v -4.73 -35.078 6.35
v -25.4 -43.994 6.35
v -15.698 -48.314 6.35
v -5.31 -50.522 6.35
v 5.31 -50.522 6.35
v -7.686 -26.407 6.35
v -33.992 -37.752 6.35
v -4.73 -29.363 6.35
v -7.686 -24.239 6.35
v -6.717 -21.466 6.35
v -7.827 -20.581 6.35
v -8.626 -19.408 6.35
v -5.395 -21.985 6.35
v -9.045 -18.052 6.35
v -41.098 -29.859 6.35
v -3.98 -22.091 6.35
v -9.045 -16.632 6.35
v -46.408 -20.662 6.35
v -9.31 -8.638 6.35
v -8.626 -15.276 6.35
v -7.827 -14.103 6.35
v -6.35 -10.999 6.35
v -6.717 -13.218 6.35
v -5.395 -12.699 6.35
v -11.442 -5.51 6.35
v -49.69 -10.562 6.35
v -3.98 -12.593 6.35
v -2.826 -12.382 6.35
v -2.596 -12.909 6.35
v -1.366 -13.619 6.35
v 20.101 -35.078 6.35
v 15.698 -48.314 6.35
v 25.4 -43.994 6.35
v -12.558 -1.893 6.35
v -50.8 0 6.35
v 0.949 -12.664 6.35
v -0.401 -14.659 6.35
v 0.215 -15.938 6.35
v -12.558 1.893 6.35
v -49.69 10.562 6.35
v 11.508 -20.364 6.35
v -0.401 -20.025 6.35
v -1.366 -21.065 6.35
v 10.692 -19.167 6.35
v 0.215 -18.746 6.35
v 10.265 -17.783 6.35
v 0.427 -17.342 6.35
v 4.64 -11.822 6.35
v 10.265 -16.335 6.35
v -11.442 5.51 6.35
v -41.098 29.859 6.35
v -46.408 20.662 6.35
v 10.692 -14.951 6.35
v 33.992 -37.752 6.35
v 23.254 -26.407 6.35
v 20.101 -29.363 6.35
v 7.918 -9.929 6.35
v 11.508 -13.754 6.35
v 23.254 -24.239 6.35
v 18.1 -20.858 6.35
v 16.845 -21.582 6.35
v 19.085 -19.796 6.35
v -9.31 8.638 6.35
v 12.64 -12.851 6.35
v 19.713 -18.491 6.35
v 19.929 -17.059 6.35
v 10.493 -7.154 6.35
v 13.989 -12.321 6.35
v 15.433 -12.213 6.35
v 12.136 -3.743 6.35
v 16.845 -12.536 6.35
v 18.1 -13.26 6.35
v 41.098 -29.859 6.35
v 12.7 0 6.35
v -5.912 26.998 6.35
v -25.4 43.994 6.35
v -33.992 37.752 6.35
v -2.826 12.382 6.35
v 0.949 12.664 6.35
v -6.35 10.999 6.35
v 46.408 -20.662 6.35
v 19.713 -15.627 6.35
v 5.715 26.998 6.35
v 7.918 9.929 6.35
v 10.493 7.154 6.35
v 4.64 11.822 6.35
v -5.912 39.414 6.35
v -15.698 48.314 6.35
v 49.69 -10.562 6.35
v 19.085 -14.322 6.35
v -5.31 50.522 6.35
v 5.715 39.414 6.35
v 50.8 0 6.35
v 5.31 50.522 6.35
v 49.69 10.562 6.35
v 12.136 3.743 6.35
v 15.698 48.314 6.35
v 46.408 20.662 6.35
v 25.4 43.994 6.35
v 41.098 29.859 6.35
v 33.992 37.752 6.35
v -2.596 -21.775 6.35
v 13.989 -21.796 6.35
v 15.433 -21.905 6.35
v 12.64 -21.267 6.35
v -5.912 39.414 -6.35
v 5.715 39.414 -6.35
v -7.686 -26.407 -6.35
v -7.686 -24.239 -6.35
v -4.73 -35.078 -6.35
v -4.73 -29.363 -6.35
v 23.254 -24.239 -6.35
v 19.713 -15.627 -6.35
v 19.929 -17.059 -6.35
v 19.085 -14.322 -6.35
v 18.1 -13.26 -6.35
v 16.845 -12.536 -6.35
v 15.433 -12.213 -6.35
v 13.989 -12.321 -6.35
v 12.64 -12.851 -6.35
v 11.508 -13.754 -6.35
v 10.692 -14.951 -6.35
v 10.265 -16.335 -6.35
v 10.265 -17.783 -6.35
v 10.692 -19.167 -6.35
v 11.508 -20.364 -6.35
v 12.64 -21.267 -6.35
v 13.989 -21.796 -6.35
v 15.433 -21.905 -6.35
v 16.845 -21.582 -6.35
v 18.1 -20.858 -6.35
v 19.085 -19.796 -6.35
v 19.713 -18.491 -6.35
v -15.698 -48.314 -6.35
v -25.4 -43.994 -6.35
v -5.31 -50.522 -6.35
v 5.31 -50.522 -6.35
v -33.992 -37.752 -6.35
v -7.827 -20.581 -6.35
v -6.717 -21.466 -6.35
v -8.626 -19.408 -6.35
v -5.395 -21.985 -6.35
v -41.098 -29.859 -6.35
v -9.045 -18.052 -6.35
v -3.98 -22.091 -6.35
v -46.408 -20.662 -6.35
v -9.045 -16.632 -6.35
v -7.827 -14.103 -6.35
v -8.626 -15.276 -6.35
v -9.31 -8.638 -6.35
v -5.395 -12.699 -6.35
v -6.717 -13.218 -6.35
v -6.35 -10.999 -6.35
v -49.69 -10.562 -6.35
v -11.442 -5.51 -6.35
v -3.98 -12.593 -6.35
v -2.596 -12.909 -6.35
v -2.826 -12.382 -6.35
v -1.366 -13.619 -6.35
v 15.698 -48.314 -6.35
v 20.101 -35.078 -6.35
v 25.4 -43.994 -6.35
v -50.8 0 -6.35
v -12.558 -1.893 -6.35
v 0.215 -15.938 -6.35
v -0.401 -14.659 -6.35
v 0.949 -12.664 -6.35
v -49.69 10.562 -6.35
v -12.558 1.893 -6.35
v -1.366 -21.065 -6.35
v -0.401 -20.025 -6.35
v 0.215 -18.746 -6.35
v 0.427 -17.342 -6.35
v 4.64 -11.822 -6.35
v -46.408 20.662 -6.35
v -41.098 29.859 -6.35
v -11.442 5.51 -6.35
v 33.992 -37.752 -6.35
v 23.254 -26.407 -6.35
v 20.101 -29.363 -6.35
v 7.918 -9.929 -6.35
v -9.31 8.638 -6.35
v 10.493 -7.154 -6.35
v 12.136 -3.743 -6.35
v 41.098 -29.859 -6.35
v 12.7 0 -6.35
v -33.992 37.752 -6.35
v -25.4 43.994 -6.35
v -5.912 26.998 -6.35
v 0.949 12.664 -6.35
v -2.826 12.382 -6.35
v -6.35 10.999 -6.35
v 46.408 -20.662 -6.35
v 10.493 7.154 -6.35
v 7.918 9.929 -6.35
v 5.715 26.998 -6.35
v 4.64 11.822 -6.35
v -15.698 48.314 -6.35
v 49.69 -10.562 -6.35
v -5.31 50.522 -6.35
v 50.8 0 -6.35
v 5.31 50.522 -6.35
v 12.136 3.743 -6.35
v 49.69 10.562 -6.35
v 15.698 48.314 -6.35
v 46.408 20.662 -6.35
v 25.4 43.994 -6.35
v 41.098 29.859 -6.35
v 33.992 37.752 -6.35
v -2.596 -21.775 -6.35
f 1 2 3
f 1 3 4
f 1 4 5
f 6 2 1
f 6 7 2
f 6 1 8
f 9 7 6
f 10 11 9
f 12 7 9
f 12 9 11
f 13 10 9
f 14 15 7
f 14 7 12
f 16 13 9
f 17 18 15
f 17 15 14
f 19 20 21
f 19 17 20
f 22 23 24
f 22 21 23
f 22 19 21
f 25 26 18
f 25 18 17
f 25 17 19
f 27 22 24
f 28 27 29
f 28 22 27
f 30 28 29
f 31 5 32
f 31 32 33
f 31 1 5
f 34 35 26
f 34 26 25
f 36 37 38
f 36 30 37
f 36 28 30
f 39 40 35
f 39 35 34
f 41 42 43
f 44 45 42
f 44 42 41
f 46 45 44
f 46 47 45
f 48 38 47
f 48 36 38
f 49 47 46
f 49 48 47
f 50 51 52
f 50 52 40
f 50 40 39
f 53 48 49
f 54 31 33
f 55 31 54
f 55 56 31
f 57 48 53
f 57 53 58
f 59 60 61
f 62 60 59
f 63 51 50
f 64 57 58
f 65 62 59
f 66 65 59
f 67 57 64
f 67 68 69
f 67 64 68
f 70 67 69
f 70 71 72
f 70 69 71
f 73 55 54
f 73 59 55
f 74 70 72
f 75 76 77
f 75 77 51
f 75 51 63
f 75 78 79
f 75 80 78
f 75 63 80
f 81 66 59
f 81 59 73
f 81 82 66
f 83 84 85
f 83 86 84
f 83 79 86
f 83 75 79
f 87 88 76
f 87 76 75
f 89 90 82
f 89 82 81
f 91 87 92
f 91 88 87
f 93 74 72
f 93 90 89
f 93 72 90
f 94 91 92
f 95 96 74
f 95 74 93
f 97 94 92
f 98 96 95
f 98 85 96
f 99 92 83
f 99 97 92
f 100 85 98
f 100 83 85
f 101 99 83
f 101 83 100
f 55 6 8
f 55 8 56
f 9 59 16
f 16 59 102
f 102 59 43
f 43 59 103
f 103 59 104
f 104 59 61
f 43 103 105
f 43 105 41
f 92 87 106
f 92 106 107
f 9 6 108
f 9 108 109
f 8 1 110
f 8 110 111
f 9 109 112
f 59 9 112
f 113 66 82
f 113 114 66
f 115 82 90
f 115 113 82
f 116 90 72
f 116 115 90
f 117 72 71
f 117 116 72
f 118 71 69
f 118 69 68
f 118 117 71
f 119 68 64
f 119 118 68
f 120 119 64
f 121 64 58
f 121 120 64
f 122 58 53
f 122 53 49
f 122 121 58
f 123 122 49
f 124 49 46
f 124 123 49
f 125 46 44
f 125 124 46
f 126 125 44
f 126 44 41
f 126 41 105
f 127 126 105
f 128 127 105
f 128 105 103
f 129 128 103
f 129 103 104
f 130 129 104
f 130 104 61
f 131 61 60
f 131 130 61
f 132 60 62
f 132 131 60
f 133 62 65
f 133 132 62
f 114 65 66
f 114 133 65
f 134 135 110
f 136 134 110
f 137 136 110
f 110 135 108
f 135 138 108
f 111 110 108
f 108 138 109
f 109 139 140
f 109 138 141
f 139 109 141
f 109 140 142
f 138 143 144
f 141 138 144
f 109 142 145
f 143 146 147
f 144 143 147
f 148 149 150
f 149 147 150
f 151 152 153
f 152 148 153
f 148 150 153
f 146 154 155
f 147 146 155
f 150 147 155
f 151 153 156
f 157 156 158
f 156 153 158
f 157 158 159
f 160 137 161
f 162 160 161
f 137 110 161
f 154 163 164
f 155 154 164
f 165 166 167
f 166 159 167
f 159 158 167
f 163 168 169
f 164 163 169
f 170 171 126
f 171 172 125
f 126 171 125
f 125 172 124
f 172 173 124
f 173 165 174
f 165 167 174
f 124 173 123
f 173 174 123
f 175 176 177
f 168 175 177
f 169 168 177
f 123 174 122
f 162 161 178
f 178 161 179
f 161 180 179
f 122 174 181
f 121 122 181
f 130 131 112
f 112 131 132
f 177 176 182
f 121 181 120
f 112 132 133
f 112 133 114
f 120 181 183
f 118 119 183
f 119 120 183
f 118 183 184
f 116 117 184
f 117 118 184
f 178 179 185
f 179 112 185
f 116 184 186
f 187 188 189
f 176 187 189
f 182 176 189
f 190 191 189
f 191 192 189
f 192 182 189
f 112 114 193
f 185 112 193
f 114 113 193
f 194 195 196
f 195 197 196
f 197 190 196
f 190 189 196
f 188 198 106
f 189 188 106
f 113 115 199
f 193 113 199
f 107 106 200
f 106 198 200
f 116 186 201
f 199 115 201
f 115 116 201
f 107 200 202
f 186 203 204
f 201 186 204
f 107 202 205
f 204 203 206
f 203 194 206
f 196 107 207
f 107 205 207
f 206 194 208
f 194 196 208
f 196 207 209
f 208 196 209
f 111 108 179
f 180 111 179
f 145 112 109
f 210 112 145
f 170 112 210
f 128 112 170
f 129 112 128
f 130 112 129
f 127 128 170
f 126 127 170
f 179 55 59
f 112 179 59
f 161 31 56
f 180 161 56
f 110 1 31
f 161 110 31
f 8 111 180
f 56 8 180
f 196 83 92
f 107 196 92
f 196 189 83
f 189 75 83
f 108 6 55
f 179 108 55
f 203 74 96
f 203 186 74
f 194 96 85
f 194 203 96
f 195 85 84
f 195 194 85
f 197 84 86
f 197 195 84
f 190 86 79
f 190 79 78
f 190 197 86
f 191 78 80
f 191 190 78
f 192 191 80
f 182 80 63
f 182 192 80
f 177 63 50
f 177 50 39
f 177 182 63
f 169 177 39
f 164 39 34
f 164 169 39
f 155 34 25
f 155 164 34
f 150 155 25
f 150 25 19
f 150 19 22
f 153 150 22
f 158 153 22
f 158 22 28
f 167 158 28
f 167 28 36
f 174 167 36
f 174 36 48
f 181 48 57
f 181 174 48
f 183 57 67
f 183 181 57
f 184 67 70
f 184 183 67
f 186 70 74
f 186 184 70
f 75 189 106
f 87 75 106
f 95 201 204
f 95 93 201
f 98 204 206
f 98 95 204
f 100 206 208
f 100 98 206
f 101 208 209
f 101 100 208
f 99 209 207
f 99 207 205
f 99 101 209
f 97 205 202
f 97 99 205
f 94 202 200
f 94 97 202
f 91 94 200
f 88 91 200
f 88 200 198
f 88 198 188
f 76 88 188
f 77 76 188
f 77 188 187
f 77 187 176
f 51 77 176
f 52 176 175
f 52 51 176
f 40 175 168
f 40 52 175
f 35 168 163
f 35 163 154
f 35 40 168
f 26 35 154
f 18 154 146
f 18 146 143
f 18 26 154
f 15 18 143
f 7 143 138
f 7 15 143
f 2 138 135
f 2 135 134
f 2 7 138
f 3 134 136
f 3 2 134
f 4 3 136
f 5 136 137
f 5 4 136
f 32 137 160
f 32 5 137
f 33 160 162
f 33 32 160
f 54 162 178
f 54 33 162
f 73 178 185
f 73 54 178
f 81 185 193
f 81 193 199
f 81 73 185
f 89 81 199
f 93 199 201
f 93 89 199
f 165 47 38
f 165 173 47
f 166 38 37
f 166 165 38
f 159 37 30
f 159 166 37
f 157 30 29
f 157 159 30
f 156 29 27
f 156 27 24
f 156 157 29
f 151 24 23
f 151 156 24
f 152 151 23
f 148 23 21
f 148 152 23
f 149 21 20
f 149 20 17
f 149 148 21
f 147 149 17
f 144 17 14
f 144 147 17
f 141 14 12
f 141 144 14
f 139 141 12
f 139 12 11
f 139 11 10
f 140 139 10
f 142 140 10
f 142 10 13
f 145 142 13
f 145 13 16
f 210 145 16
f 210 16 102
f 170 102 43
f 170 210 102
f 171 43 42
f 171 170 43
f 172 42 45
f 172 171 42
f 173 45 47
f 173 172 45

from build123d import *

# Parameters (mm, degrees)
F0_R     = 50.8
F0_R_2   = 4.7623858448
F0_R_3   = 12.7
F0_W     = 24.8306924477
F0_H     = 5.7149995118
F0_W_2   = 30.9398272075
F0_H_2   = 2.1677576005
F0_R_4   = 4.8592779804
F0_W_3   = 11.6270687431
F0_H_3   = 12.4153457582
F1_DEPTH = 6.35


# Not quite as in the source:
# - a length typed as a fraction of an inch, garbled in the dataset ("3 / 203.2 mm" for 3/8 in), is restored


with BuildPart() as f1:
    # F0 (on Top) → F1 (new body, symmetric)
    with BuildSketch(Plane.XY):
        Circle(F0_R)
        with Locations((-4.3355170637, -17.3420701176)):
            Circle(F0_R_2, mode=Mode.SUBTRACT)
        Circle(F0_R_3, mode=Mode.SUBTRACT)
        with Locations((7.6856906526, -32.2207761928)):
            Rectangle(F0_W, F0_H, mode=Mode.SUBTRACT)
        with Locations((7.7842238825, -25.3233611584)):
            Rectangle(F0_W_2, F0_H_2, mode=Mode.SUBTRACT)
        with Locations((15.0699028745, -17.0589182526)):
            Circle(F0_R_4, mode=Mode.SUBTRACT)
        with Locations((-0.0985348597, 33.206121996)):
            Rectangle(F0_W_3, F0_H_3, mode=Mode.SUBTRACT)
    extrude(amount=F1_DEPTH, both=True)


solid = f1.part
